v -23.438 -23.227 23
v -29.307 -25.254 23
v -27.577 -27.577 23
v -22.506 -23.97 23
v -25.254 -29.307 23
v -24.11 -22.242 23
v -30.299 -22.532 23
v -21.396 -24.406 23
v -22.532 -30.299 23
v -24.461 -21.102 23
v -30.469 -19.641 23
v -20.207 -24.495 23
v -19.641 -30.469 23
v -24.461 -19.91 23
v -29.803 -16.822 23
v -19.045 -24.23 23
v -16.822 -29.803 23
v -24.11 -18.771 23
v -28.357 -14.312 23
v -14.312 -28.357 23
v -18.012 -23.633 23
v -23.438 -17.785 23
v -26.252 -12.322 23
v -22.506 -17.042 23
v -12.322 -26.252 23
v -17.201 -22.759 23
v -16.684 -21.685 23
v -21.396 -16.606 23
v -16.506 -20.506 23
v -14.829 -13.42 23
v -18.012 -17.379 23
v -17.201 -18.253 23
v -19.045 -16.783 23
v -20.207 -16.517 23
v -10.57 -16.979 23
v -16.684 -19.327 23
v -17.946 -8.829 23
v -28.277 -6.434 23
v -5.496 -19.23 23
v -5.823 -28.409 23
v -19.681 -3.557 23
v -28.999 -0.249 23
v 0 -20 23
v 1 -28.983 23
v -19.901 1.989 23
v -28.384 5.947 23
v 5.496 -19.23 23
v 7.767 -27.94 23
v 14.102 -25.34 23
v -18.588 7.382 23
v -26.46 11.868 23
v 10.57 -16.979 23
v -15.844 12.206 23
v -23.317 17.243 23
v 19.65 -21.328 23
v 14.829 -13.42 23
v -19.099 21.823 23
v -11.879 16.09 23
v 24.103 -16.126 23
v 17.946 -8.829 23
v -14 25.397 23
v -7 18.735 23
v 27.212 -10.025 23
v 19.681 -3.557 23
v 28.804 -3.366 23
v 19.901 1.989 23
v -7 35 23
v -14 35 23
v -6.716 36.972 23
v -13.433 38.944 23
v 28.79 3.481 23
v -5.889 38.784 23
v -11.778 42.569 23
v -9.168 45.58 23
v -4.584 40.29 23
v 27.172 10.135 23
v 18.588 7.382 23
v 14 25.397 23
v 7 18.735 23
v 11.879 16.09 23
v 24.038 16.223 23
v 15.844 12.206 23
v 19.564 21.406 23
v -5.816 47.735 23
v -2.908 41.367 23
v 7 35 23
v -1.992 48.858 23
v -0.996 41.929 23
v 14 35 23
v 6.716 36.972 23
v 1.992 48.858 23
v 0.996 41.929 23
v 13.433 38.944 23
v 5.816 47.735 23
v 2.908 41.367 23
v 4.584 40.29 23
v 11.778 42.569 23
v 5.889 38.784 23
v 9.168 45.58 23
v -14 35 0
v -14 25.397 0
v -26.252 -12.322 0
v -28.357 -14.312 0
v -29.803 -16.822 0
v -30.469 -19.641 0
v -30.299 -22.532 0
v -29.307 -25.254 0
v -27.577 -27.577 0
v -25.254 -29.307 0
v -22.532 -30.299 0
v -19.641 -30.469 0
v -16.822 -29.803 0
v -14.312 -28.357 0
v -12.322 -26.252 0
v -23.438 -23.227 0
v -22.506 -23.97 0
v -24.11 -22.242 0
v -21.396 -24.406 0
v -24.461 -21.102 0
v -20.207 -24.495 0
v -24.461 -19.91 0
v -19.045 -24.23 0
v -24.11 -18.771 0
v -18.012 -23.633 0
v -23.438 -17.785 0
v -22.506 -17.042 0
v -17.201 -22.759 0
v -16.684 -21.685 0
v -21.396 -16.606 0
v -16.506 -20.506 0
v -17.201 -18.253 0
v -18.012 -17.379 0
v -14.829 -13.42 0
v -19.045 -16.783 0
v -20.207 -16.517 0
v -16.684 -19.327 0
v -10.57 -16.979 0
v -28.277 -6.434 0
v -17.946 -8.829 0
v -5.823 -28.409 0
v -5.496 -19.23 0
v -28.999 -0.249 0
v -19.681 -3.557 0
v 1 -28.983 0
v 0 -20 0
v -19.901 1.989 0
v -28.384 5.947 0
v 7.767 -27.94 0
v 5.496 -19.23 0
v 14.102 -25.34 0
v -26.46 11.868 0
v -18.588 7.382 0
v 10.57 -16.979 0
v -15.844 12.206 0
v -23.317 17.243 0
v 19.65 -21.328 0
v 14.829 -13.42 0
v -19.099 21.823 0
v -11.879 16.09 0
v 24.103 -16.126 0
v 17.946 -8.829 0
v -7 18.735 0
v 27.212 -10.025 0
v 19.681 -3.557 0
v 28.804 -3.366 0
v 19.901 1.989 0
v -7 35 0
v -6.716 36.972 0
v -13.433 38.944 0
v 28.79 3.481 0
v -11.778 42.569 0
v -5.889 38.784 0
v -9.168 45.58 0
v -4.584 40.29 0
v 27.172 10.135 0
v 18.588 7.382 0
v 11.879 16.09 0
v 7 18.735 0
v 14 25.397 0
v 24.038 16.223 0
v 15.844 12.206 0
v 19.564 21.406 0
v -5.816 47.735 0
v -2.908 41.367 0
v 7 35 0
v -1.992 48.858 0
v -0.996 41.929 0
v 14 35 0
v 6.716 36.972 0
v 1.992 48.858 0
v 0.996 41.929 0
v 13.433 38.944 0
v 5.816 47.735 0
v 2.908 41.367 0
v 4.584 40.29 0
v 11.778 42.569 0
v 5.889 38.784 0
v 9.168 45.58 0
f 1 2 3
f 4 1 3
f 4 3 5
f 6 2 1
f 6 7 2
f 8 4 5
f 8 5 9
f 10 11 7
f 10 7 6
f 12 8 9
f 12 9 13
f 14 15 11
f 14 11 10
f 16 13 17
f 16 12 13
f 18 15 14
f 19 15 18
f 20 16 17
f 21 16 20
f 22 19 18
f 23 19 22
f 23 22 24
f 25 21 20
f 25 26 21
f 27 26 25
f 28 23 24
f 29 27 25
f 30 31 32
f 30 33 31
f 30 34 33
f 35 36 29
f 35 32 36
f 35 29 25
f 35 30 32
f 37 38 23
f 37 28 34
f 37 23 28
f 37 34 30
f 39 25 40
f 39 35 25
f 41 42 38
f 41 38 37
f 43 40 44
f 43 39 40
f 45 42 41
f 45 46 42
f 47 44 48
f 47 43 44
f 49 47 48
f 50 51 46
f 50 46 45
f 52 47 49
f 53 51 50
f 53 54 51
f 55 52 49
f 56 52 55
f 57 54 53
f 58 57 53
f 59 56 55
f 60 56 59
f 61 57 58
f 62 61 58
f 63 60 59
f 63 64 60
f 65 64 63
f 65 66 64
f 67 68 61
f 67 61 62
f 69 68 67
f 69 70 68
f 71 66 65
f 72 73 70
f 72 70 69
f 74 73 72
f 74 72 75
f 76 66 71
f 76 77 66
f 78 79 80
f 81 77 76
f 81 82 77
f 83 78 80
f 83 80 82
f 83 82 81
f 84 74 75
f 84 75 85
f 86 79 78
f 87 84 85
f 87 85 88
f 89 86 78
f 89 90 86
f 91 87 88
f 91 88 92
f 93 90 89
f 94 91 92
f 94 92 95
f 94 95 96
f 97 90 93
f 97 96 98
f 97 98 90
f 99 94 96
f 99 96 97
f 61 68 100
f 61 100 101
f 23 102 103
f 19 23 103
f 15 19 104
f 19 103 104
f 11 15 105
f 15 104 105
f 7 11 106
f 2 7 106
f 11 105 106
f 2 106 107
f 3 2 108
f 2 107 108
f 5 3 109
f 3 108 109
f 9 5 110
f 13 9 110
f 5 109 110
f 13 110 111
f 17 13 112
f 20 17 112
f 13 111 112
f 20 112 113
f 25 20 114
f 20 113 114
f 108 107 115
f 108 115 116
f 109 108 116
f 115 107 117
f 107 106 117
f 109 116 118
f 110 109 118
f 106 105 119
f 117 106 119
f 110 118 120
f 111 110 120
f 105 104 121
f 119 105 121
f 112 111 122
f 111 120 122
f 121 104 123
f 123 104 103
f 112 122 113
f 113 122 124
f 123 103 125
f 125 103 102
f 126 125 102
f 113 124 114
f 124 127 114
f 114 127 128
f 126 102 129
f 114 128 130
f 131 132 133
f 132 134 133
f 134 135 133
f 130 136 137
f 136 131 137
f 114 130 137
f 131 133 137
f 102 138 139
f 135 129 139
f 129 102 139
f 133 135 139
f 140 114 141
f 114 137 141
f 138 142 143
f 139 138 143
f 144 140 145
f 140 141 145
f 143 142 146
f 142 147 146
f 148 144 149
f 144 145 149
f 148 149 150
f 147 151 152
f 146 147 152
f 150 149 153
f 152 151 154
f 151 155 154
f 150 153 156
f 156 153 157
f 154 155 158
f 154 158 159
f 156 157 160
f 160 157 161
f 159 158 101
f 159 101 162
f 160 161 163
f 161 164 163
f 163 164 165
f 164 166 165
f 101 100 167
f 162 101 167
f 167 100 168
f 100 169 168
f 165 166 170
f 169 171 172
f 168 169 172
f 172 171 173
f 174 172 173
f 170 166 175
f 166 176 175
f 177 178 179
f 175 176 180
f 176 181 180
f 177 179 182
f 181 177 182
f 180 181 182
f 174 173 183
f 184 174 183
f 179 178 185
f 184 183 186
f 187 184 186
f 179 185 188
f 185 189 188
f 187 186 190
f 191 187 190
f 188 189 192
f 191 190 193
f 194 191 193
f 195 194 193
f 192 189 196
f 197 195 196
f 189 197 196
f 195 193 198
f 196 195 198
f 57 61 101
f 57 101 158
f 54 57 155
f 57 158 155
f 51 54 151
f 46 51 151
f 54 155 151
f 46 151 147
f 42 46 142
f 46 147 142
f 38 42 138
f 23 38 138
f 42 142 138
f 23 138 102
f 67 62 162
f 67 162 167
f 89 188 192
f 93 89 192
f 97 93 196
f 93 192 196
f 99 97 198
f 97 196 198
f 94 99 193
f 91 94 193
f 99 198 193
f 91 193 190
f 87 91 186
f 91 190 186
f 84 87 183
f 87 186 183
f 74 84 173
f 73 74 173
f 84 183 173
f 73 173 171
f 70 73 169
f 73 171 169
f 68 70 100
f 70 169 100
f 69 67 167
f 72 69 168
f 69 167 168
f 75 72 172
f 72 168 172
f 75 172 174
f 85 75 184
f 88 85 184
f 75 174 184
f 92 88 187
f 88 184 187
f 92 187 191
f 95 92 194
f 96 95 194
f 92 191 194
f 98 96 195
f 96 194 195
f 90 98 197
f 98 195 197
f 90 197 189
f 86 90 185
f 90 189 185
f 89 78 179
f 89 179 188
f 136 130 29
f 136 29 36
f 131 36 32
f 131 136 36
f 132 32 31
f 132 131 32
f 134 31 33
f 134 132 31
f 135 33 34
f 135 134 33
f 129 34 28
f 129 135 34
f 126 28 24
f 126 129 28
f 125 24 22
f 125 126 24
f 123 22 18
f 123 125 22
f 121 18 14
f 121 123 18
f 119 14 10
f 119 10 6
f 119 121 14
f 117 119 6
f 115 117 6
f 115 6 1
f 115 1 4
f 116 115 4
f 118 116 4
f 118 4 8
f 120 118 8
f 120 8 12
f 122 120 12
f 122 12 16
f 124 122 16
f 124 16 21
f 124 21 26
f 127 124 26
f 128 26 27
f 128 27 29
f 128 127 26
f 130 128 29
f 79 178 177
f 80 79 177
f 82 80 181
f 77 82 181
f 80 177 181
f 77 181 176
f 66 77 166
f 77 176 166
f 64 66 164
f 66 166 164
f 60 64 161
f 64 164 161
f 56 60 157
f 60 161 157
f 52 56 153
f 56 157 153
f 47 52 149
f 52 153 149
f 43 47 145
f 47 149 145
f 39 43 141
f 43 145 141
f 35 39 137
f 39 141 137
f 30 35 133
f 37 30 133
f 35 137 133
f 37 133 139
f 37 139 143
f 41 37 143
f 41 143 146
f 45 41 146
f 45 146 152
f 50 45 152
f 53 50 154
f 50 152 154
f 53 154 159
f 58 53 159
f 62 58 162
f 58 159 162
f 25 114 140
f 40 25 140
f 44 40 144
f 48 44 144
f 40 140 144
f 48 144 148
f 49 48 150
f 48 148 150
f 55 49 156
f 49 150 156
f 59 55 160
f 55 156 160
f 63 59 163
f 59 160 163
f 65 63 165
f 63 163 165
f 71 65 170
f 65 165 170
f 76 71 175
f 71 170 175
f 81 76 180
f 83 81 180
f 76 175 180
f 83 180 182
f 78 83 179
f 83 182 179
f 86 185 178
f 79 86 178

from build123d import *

# Parameters (mm, degrees)
SKETCH_1_R      = 4
EXTRUDE_1_DEPTH = 23


with BuildPart() as part:
    # Sketch 1 → Extrude 1 (new body)
    with BuildSketch(Plane.XY):
        with BuildLine():
            Line((14, 25.396850198), (14, 35))
            ThreePointArc((14, 35), (0, 49), (-14, 35))
            Line((-14, 35), (-14, 25.396850198))
            ThreePointArc((-14, 25.396850198), (-27.581369596, 8.959243897), (-26.252122851, -12.321771212))
            ThreePointArc((-26.252122851, -12.321771212), (-27.577164466, -27.577164466), (-12.321771212, -26.252122851))
            ThreePointArc((-12.321771212, -26.252122851), (25.83811559, -13.167831361), (14, 25.396850198))
        make_face()
        with BuildLine():
            Line((-7, 18.734993995), (-7, 35))
            ThreePointArc((-7, 35), (0, 42), (7, 35))
            Line((7, 35), (7, 18.734993995))
            ThreePointArc((7, 18.734993995), (0, -20), (-7, 18.734993995))
        make_face(mode=Mode.SUBTRACT)
        with Locations((-20.506096654, -20.506096654)):
            Circle(SKETCH_1_R, mode=Mode.SUBTRACT)
    extrude(amount=EXTRUDE_1_DEPTH)


solid = part.part
